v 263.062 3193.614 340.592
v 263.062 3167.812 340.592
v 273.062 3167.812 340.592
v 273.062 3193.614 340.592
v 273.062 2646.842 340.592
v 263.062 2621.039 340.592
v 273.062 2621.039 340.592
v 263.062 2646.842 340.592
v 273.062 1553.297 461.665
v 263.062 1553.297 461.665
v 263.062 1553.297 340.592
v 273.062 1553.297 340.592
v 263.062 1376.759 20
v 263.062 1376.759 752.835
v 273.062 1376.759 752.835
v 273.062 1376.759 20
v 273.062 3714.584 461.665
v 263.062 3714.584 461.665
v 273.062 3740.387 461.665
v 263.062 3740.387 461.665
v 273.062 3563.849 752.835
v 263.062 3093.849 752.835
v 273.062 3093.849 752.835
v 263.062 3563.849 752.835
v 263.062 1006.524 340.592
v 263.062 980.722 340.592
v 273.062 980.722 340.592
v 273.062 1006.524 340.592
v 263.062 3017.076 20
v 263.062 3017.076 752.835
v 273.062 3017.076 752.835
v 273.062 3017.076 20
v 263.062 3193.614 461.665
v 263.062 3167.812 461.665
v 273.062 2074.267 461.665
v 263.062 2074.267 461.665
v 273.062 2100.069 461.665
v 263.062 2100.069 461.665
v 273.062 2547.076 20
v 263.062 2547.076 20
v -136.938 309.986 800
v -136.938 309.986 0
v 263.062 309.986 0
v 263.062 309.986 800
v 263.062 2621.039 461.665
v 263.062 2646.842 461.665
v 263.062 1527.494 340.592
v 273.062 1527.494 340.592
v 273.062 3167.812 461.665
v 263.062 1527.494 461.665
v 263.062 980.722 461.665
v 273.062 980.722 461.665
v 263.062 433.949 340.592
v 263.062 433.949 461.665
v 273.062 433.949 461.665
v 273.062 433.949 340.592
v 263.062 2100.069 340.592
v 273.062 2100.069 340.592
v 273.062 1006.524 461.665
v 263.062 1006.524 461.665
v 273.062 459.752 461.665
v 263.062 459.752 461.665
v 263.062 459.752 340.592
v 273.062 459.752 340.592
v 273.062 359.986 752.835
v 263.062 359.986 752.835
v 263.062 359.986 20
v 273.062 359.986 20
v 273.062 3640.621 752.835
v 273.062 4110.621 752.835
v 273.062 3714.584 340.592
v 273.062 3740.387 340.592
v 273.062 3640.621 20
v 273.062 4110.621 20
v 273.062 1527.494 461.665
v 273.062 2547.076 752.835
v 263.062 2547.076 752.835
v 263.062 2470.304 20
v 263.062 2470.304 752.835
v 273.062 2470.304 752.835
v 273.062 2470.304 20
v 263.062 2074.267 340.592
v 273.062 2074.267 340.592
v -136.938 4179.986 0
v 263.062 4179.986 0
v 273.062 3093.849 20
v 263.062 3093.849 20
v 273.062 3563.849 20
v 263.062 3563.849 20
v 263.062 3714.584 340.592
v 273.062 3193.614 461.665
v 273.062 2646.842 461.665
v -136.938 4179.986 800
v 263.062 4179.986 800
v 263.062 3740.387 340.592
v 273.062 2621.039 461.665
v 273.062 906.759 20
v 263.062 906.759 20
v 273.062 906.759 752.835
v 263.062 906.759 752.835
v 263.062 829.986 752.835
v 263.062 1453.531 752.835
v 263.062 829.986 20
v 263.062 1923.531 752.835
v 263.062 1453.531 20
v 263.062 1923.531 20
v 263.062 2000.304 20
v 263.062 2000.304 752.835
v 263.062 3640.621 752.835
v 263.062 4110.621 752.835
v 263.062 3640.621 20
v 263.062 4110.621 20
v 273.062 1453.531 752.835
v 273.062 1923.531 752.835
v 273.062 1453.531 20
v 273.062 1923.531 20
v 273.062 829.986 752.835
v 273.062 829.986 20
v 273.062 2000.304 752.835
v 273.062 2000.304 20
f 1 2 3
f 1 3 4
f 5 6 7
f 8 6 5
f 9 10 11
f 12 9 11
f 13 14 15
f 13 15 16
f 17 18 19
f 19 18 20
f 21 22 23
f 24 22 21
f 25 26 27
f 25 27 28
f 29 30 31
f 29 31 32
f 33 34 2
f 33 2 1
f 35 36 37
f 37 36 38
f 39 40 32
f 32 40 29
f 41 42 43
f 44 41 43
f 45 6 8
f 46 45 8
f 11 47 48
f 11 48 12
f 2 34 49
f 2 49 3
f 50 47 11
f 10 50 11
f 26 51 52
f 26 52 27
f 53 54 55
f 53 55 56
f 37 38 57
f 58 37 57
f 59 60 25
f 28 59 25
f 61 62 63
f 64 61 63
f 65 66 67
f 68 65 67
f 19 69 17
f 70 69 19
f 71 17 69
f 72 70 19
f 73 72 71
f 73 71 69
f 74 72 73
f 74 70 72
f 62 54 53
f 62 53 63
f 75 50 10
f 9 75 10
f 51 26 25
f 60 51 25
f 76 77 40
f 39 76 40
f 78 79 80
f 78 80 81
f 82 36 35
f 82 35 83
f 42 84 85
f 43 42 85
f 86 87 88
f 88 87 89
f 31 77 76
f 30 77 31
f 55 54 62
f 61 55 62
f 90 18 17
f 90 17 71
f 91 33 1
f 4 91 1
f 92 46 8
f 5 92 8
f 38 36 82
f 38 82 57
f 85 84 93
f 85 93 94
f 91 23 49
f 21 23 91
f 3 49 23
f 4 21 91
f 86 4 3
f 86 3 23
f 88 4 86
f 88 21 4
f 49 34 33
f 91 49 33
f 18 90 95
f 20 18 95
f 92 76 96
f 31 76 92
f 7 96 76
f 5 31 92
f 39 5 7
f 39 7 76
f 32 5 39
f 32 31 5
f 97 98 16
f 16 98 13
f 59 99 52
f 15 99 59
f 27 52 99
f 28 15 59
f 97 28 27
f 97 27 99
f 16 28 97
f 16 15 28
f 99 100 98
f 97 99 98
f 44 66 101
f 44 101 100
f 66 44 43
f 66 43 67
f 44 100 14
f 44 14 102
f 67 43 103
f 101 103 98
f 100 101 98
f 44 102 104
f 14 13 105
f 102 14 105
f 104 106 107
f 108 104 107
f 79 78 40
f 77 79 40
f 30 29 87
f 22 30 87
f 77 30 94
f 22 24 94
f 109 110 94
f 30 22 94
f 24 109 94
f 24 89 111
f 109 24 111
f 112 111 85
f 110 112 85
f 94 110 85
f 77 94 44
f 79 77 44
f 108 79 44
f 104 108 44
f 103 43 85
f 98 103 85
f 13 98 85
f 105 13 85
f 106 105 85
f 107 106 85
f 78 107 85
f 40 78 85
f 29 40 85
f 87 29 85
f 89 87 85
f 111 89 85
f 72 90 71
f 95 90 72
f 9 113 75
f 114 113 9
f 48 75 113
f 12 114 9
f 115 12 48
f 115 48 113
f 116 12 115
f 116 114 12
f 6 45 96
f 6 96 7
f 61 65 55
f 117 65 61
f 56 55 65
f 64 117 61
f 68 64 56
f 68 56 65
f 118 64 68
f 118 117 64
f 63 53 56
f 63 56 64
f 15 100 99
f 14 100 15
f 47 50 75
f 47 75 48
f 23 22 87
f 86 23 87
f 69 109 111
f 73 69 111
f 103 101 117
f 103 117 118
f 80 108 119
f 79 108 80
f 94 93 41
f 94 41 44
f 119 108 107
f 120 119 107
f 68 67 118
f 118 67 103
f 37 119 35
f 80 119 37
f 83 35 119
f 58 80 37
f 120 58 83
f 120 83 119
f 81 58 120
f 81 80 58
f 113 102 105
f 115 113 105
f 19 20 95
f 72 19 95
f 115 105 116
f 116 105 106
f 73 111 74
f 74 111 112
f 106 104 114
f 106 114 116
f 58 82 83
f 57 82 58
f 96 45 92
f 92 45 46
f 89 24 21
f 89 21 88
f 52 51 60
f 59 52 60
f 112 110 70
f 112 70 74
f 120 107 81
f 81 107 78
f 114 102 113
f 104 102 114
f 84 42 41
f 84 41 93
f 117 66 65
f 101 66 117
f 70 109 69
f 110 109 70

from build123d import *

# Parameters (mm, degrees)
SKETCH1_W           = 400
SKETCH1_H           = 3870
BOSS_EXTRUDE1_DEPTH = 800
SKETCH3_W           = 732.835133331
SKETCH3_H           = 470
SKETCH3_W_2         = 121.072841775
SKETCH3_H_2         = 25.802408902
SKETCH3_H_3         = 25.802408903
BOSS_EXTRUDE3_DEPTH = 10


with BuildPart() as part:
    # Sketch1 → Boss-Extrude1 (new body)
    with BuildSketch(Plane.XY):
        with Locations((63.061970043, 2244.986327315)):
            Rectangle(SKETCH1_W, SKETCH1_H)
    extrude(amount=BOSS_EXTRUDE1_DEPTH)

    # Sketch3 → Boss-Extrude3 (add)
    with BuildSketch(Plane(origin=(263.061970043, 0, 0), x_dir=(0, 0, -1), z_dir=(1, 0, 0))):
        with Locations((-386.417566666, 594.986327315)):
            Rectangle(SKETCH3_W, SKETCH3_H)
        with Locations((-401.128332344, 446.85045415)):
            Rectangle(SKETCH3_W_2, SKETCH3_H_2, mode=Mode.SUBTRACT)
        with Locations((-386.417566666, 1141.758813467)):
            Rectangle(SKETCH3_W, SKETCH3_H)
        with Locations((-401.128332344, 993.622940303)):
            Rectangle(SKETCH3_W_2, SKETCH3_H_3, mode=Mode.SUBTRACT)
        with Locations((-386.417566666, 1688.531299619)):
            Rectangle(SKETCH3_W, SKETCH3_H)
        with Locations((-401.128332344, 1540.395426455)):
            Rectangle(SKETCH3_W_2, SKETCH3_H_3, mode=Mode.SUBTRACT)
        with Locations((-386.417566666, 2235.303785772)):
            Rectangle(SKETCH3_W, SKETCH3_H)
        with Locations((-401.128332344, 2087.167912607)):
            Rectangle(SKETCH3_W_2, SKETCH3_H_3, mode=Mode.SUBTRACT)
        with Locations((-386.417566666, 2782.076271924)):
            Rectangle(SKETCH3_W, SKETCH3_H)
        with Locations((-401.128332344, 2633.940398759)):
            Rectangle(SKETCH3_W_2, SKETCH3_H_3, mode=Mode.SUBTRACT)
        with Locations((-386.417566666, 3328.848758076)):
            Rectangle(SKETCH3_W, SKETCH3_H)
        with Locations((-401.128332344, 3180.712884911)):
            Rectangle(SKETCH3_W_2, SKETCH3_H_2, mode=Mode.SUBTRACT)
        with Locations((-386.417566666, 3875.621244228)):
            Rectangle(SKETCH3_W, SKETCH3_H)
        with Locations((-401.128332344, 3727.485371064)):
            Rectangle(SKETCH3_W_2, SKETCH3_H_3, mode=Mode.SUBTRACT)
    extrude(amount=BOSS_EXTRUDE3_DEPTH)


solid = part.part
